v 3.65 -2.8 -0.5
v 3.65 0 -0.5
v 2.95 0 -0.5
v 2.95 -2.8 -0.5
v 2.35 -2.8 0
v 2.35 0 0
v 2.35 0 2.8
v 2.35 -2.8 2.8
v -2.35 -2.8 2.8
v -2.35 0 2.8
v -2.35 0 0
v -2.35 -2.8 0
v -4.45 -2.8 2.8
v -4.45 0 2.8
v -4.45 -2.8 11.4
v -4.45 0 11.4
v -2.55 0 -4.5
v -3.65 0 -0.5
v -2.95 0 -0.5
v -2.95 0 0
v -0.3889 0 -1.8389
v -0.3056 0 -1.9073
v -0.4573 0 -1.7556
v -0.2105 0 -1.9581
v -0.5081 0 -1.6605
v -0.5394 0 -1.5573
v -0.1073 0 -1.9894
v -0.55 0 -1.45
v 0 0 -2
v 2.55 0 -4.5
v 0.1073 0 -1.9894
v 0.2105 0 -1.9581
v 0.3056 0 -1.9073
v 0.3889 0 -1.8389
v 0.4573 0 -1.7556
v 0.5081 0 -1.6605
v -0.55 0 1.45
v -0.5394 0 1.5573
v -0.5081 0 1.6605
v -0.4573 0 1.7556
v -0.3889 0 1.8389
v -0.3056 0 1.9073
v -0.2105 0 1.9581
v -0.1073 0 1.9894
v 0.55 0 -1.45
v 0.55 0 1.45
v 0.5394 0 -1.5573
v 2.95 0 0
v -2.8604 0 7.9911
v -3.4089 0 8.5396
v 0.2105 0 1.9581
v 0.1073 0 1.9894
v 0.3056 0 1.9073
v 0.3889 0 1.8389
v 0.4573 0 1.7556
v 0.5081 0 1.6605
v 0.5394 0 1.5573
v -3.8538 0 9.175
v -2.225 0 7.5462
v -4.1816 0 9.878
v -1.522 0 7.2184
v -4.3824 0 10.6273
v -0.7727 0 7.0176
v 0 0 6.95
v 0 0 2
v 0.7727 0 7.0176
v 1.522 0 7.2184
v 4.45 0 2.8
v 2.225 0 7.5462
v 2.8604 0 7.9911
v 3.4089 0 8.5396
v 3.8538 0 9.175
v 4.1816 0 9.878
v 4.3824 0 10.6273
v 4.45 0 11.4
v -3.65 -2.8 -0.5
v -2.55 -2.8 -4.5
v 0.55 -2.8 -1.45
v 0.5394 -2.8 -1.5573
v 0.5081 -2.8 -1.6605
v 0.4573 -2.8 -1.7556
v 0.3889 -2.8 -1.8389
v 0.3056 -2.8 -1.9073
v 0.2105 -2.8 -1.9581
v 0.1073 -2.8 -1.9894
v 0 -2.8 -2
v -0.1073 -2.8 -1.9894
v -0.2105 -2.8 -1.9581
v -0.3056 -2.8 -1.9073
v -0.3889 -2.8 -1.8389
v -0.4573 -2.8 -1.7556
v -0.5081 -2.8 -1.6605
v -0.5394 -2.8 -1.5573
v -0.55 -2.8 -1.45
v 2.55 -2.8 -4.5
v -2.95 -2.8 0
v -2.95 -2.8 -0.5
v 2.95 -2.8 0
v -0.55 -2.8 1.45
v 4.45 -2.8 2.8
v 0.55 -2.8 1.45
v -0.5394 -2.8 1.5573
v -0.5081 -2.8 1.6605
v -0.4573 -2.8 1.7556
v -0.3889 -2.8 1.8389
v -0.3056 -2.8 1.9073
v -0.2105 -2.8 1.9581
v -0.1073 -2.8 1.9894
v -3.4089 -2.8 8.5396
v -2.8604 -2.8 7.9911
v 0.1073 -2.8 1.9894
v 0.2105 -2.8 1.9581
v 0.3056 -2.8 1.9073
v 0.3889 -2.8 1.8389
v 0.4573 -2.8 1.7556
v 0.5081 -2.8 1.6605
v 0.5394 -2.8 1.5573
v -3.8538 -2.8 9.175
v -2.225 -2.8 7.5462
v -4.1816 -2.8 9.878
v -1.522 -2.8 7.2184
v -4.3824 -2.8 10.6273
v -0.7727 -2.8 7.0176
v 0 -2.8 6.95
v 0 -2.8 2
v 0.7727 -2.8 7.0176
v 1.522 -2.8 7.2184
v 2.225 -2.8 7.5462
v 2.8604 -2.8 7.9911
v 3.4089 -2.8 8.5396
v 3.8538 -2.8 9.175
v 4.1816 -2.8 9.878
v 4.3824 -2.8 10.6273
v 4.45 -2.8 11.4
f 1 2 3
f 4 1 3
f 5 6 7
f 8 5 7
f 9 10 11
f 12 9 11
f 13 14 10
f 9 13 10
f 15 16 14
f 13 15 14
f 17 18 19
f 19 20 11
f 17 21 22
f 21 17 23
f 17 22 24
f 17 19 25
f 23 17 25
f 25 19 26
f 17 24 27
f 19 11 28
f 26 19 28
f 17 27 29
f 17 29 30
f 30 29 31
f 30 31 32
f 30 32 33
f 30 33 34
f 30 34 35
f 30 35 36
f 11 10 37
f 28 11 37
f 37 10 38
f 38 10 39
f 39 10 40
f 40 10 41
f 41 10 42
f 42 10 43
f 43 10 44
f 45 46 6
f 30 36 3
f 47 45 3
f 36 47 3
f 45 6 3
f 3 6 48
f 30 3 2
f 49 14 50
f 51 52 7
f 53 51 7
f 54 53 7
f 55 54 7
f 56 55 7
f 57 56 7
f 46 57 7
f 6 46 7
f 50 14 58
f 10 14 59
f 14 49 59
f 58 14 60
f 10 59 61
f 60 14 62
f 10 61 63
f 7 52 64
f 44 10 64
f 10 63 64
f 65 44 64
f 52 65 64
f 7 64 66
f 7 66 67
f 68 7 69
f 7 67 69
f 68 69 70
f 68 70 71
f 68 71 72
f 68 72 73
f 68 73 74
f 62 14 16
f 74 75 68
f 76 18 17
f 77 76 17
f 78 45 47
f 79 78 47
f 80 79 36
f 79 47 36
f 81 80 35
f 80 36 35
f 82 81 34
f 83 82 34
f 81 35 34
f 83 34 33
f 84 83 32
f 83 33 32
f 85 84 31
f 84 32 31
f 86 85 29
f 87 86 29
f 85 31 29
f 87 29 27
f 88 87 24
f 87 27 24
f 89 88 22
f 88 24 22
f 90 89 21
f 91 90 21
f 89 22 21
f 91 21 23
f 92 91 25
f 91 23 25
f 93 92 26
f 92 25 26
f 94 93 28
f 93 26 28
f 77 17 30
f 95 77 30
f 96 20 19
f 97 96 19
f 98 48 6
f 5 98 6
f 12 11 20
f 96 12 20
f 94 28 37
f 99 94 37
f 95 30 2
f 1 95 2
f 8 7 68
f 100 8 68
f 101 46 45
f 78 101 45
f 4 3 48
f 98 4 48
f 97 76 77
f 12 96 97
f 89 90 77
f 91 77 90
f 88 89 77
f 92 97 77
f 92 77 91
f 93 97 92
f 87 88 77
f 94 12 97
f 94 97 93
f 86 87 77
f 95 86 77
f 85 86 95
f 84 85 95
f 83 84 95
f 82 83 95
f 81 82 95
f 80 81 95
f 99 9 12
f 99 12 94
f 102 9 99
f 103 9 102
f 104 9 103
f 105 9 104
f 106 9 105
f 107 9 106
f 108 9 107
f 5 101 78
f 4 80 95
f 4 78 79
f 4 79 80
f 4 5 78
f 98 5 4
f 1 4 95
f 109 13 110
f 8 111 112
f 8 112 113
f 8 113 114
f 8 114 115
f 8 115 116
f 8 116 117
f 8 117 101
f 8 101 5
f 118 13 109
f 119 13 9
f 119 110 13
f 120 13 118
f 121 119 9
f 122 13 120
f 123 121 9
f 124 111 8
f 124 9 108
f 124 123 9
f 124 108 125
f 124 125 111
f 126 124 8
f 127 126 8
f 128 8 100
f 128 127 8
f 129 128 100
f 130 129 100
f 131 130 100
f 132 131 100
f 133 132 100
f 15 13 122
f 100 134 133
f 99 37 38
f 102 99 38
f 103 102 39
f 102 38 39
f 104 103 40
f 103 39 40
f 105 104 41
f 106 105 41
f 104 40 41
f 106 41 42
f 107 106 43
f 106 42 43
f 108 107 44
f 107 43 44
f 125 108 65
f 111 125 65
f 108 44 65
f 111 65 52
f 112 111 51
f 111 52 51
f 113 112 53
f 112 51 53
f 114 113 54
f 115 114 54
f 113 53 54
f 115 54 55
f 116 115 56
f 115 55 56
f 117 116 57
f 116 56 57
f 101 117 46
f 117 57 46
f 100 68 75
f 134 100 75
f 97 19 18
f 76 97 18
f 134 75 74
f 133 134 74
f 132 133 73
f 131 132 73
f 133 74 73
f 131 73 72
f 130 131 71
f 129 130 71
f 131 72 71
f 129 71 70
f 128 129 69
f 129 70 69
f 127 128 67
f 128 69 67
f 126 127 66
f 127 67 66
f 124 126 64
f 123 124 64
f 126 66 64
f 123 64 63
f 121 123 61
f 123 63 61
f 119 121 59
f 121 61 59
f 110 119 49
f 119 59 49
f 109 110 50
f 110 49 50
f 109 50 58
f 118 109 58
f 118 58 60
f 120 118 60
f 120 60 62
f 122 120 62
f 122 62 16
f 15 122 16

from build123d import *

# Parameters (mm, degrees)
F1_DEPTH = 2.8


with BuildPart() as f1:
    # F0 (on Front) → F1 (new body)
    with BuildSketch(Plane.XZ):
        with BuildLine():
            ThreePointArc((4.45, 11.4), (0, 6.95), (-4.45, 11.4))
            Line((-4.45, 11.4), (-4.45, 2.8))
            Line((-4.45, 2.8), (-2.35, 2.8))
            Line((-2.35, 2.8), (-2.35, 0))
            Line((-2.35, 0), (-2.95, 0))
            Line((-2.95, 0), (-2.95, -0.5))
            Line((-2.95, -0.5), (-3.65, -0.5))
            Line((-3.65, -0.5), (-2.55, -4.5))
            Line((-2.55, -4.5), (2.55, -4.5))
            Line((2.55, -4.5), (3.65, -0.5))
            Line((3.65, -0.5), (2.95, -0.5))
            Line((2.95, -0.5), (2.95, 0))
            Line((2.95, 0), (2.35, 0))
            Line((2.35, 0), (2.35, 2.8))
            Line((2.35, 2.8), (4.45, 2.8))
            Line((4.45, 2.8), (4.45, 11.4))
        make_face()
        with BuildLine():
            ThreePointArc((-0.55, 1.45), (0, 2), (0.55, 1.45))
            Line((0.55, 1.45), (0.55, -1.45))
            ThreePointArc((0.55, -1.45), (0, -2), (-0.55, -1.45))
            Line((-0.55, -1.45), (-0.55, 1.45))
        make_face(mode=Mode.SUBTRACT)
    extrude(amount=F1_DEPTH)


solid = f1.part
